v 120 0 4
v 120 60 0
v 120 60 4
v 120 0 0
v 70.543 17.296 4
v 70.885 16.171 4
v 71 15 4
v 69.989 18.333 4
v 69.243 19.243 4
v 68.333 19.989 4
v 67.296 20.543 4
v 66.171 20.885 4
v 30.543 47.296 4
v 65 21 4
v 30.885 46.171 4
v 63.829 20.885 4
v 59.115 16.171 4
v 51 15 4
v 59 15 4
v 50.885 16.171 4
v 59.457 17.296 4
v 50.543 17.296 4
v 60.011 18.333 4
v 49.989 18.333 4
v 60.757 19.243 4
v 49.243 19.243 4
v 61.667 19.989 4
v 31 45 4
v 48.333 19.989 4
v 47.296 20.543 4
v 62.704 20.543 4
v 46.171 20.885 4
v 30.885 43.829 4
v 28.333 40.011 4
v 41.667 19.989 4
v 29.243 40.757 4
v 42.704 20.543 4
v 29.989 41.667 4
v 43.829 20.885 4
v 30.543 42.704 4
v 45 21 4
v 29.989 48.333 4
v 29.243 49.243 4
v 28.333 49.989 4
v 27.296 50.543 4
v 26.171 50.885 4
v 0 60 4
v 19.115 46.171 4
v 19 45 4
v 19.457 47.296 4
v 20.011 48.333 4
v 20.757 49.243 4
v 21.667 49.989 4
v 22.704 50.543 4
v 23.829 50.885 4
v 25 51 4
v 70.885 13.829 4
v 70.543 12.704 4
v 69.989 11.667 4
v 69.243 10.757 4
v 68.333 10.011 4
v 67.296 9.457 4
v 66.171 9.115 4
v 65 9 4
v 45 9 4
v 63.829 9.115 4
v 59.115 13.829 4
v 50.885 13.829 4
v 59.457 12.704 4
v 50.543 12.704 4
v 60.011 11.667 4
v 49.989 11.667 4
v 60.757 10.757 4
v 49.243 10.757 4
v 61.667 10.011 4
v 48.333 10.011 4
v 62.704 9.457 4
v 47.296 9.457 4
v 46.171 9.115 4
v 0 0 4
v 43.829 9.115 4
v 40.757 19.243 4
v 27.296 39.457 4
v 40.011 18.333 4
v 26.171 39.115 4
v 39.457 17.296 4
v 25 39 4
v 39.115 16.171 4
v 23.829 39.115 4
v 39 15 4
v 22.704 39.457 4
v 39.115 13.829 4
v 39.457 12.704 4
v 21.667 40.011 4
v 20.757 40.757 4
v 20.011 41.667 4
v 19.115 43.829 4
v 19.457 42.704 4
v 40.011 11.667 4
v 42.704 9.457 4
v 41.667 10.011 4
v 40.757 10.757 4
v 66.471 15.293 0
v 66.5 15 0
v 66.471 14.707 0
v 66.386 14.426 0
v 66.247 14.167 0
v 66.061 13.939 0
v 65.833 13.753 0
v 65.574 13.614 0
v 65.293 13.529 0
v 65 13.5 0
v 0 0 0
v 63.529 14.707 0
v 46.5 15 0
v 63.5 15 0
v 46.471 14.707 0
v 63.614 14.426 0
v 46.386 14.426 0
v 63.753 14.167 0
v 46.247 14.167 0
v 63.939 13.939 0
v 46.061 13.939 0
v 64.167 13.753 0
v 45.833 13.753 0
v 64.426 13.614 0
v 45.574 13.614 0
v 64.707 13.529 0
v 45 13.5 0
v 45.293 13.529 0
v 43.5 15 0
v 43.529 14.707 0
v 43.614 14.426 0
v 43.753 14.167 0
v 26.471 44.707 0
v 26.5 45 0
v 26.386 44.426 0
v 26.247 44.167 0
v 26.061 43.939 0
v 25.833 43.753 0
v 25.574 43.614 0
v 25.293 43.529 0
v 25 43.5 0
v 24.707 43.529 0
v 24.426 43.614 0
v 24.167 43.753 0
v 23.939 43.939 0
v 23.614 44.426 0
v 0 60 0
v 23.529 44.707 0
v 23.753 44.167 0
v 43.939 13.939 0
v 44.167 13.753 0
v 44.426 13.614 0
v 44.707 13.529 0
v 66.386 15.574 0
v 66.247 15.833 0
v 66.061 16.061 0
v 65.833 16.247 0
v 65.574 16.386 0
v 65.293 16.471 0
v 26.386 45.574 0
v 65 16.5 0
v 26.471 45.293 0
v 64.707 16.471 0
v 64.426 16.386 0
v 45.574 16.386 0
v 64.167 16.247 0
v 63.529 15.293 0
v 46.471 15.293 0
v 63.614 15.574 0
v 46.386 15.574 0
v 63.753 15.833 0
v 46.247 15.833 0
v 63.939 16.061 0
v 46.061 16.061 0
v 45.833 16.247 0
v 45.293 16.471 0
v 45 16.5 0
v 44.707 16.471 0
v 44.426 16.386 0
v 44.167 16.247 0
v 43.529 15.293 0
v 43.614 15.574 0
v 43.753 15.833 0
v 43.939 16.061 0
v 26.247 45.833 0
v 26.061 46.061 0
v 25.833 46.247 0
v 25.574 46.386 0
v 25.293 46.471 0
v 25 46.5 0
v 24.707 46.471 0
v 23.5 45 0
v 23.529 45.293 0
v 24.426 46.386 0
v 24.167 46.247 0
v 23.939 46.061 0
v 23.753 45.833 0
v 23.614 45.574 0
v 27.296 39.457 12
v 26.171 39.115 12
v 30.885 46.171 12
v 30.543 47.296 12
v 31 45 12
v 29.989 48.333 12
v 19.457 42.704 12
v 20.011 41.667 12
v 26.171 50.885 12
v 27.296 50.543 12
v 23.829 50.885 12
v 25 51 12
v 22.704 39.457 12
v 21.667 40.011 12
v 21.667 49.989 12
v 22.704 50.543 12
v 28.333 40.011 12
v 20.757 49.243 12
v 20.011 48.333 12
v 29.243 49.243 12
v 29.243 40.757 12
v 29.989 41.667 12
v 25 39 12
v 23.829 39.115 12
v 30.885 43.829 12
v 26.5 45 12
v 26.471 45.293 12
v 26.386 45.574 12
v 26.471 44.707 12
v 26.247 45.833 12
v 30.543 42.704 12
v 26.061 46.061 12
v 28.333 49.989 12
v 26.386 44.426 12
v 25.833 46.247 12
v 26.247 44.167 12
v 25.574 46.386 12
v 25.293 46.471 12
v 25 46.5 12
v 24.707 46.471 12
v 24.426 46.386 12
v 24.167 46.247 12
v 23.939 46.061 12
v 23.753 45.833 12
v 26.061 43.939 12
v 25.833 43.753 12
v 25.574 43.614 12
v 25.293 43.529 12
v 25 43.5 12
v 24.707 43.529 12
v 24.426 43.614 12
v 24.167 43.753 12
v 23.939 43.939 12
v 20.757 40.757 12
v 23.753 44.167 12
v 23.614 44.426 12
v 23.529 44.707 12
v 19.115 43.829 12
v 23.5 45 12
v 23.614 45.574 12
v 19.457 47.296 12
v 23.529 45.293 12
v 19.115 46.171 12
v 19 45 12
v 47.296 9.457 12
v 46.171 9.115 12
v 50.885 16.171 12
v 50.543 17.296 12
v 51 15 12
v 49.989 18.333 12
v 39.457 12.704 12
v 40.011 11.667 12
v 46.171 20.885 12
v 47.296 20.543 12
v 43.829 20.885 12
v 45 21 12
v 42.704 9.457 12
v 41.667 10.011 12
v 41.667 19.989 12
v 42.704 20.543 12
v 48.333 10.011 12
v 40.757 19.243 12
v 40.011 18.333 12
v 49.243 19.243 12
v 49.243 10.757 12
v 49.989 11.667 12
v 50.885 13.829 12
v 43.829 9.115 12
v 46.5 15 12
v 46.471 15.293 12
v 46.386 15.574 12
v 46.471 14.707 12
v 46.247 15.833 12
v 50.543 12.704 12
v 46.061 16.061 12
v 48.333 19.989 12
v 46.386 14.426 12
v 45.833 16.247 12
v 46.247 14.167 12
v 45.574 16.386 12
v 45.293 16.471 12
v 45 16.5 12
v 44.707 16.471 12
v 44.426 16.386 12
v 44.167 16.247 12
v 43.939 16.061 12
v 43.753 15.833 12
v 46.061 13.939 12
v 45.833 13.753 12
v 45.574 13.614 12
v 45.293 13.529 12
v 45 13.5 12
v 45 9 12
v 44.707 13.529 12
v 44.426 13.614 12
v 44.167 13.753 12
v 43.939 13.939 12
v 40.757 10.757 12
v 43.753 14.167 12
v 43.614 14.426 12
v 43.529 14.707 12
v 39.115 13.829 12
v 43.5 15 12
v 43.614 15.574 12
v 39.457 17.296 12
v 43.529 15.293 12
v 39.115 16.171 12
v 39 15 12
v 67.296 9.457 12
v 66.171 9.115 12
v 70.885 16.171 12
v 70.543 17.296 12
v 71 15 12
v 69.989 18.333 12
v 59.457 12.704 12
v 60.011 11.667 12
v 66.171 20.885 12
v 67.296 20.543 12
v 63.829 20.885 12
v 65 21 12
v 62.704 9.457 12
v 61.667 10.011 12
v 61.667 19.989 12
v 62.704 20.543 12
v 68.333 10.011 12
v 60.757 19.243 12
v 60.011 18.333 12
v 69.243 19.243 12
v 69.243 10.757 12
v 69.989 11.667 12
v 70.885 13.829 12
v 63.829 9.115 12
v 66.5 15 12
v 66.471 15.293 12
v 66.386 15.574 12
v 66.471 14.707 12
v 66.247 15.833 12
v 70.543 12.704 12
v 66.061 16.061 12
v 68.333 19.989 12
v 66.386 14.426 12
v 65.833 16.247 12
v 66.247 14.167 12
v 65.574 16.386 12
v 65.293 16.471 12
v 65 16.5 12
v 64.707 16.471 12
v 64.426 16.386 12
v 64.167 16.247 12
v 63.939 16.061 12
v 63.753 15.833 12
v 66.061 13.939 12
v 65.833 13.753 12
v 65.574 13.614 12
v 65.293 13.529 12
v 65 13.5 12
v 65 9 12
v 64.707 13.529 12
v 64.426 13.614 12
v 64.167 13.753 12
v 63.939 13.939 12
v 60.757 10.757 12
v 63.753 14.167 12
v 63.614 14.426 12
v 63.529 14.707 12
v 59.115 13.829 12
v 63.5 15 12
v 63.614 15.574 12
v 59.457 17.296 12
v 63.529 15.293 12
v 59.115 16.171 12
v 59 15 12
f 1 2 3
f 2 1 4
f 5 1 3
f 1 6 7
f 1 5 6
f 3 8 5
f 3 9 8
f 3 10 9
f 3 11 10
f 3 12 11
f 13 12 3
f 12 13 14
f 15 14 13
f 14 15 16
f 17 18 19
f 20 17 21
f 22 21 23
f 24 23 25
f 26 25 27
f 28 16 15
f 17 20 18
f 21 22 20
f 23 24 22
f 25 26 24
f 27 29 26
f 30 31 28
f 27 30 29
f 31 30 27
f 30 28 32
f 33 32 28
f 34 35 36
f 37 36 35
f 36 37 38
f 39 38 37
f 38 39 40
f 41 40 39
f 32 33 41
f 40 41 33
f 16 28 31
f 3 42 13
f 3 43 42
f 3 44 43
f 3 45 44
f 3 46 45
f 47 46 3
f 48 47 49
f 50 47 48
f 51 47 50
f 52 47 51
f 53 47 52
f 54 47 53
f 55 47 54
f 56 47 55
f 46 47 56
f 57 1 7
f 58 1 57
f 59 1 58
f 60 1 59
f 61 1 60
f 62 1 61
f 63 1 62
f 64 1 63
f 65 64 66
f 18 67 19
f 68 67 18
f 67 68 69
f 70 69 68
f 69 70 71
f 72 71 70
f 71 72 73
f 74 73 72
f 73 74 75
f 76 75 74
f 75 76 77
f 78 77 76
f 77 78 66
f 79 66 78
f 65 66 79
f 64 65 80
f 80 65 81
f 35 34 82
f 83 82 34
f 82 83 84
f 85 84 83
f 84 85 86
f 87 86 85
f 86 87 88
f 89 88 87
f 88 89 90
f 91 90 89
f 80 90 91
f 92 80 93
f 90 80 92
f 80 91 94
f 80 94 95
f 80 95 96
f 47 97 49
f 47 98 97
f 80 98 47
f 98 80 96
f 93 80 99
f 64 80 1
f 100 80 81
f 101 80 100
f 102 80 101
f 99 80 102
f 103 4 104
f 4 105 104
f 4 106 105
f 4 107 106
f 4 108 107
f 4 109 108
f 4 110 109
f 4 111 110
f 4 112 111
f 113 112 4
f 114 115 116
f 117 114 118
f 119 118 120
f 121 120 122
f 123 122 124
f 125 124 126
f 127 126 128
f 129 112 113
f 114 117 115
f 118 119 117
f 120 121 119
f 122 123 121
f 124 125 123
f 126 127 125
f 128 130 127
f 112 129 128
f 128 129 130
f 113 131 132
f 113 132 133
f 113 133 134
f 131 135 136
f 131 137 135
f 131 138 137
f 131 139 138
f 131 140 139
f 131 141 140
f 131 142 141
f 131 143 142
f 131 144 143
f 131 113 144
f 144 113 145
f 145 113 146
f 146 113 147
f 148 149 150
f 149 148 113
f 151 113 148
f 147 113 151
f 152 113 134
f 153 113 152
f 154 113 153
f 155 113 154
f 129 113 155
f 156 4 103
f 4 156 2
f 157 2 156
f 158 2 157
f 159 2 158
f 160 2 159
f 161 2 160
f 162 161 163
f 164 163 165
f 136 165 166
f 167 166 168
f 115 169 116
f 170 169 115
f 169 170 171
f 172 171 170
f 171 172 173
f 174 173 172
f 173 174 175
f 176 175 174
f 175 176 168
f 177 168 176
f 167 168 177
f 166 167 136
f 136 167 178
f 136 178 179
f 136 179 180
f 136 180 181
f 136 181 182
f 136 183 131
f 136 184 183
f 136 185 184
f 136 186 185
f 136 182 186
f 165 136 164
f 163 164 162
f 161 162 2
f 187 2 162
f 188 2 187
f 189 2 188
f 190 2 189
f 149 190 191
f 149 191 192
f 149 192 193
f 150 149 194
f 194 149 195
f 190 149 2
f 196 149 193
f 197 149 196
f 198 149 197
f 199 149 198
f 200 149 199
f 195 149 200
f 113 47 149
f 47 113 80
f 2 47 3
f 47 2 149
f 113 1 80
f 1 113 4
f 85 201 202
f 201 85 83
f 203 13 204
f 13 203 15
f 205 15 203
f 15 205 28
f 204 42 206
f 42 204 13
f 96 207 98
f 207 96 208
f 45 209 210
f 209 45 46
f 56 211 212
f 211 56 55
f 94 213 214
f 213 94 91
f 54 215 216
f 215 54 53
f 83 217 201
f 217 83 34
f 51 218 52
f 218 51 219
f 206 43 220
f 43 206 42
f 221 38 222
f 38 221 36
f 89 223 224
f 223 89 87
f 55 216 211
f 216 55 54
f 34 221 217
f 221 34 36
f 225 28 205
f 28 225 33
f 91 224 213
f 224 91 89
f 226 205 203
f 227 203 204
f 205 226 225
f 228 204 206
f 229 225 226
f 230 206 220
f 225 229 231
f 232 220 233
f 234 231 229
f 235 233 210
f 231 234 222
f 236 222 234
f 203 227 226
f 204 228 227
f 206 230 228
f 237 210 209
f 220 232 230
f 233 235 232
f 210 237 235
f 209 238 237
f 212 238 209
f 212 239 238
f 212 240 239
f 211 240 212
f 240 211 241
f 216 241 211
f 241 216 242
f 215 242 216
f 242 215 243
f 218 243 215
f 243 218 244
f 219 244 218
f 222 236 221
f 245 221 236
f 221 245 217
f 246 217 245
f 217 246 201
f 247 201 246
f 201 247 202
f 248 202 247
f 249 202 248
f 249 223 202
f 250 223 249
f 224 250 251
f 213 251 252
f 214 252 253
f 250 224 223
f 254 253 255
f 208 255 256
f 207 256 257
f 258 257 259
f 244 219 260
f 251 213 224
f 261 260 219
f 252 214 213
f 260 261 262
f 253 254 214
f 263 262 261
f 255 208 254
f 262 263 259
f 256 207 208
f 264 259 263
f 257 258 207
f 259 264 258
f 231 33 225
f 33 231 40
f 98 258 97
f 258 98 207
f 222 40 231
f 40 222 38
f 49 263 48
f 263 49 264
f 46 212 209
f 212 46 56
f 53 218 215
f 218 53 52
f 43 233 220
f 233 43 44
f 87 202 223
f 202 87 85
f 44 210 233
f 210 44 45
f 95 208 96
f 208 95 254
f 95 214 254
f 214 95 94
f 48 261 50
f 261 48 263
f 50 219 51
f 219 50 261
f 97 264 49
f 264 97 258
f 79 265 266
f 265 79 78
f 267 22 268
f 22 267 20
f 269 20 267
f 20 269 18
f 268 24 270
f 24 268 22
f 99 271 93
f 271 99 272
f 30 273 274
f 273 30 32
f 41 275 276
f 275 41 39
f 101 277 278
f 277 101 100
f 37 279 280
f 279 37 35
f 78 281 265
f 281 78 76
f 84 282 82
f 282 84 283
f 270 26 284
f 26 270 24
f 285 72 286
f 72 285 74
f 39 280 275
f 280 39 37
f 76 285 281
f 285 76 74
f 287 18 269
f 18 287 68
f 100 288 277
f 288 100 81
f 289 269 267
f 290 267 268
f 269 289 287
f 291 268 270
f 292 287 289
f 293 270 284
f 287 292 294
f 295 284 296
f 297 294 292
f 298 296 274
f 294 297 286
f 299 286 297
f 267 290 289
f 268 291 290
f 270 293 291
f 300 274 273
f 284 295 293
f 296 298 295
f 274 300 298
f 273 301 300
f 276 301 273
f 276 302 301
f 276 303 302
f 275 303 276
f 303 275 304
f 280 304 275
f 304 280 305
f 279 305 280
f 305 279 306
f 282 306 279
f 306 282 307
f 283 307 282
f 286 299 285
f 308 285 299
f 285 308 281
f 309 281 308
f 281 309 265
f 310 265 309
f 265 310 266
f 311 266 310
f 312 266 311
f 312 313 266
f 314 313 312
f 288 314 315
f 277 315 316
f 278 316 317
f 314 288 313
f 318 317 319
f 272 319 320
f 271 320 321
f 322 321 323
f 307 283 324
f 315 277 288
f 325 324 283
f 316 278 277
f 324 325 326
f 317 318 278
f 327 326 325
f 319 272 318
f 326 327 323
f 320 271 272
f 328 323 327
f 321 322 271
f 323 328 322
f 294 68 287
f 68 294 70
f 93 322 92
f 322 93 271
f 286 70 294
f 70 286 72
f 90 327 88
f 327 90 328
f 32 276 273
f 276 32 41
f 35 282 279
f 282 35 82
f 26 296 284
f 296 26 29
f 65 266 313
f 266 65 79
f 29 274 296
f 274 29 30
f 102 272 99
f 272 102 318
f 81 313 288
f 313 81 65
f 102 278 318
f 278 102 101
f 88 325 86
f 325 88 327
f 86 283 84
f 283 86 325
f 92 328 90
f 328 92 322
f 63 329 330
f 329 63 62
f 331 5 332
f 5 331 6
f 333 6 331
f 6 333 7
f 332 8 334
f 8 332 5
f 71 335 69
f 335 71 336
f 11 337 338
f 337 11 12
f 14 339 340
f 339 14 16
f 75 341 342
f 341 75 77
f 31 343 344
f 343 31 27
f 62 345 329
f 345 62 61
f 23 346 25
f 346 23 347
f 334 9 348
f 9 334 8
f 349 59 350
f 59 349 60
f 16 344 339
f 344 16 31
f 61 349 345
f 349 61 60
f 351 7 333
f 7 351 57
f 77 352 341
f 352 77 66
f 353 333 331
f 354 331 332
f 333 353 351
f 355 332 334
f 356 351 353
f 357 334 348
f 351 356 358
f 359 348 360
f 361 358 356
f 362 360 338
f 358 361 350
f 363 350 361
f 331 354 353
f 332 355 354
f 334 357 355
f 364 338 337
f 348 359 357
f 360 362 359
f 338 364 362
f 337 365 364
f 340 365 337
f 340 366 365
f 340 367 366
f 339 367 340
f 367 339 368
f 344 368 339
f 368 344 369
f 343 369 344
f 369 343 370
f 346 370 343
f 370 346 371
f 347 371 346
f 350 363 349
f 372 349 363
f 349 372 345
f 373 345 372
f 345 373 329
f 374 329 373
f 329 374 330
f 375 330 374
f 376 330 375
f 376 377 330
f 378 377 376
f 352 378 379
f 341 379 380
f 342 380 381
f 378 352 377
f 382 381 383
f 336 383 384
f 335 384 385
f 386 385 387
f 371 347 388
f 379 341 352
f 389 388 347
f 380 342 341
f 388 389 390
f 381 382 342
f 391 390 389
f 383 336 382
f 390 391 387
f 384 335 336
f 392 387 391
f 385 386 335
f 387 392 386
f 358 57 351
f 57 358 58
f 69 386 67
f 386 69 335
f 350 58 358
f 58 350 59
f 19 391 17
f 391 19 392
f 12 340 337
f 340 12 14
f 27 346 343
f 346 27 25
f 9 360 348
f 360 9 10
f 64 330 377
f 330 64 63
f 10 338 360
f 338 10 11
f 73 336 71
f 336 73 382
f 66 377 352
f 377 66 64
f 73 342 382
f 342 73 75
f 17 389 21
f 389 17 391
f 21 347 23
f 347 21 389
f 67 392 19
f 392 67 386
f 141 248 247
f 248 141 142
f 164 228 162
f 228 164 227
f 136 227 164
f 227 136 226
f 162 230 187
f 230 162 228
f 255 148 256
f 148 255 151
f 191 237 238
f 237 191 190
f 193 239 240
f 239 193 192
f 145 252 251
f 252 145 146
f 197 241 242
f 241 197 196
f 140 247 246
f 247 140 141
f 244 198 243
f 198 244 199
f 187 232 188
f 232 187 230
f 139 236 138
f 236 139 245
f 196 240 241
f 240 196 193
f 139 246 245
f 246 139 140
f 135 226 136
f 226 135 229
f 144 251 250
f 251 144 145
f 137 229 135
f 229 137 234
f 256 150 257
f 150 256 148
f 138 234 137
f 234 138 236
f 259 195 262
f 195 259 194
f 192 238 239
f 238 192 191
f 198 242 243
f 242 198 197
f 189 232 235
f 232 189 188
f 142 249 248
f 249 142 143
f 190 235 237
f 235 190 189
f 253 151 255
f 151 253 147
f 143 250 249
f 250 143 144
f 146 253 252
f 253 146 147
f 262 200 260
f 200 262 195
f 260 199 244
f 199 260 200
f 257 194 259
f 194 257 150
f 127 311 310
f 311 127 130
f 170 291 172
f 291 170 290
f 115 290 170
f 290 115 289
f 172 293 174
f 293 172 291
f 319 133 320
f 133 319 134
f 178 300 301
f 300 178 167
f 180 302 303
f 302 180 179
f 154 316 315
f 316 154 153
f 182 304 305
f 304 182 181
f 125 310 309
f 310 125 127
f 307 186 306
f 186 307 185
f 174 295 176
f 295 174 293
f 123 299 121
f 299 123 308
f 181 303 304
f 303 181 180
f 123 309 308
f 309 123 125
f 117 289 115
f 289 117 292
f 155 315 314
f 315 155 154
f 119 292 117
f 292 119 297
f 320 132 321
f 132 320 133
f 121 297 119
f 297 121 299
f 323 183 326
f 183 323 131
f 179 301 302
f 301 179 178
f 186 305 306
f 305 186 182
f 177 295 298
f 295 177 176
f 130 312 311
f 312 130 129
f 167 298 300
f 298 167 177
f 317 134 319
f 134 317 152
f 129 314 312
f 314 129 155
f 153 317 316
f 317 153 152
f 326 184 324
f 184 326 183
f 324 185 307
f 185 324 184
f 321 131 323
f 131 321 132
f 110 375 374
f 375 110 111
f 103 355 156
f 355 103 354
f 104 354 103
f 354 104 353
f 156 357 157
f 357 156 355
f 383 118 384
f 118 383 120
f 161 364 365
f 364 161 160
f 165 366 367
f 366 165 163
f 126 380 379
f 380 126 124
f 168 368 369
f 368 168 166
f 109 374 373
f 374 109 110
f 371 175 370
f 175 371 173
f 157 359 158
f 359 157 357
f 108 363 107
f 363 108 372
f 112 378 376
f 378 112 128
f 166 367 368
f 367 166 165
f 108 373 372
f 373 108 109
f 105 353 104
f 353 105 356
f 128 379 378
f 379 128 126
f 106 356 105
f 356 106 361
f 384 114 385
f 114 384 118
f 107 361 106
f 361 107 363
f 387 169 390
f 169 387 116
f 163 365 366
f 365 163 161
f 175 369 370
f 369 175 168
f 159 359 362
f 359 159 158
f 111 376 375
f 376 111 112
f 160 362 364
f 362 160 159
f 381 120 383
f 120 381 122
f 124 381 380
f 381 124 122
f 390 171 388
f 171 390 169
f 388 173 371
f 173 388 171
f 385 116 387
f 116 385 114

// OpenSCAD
$fn = 32;

// ----------------------------------------------------------------------
// Boss field: plate with bosses at given coordinates
// ----------------------------------------------------------------------

// --- parameters (mm) ---
plate_l = 120;            // plate length, X
plate_w = 60;             // plate width, Y
plate_t = 4;              // plate thickness, Z
boss_d = 12;              // boss diameter
boss_h = 8;               // boss height above the plate
bore_d = 3;               // boss bore

total_h = plate_t + boss_h;  // overall height

difference() {
  union() {
    cube([plate_l, plate_w, plate_t]);
    translate([25, 45, plate_t]) cylinder(h = boss_h, d = boss_d);
    translate([45, 15, plate_t]) cylinder(h = boss_h, d = boss_d);
    translate([65, 15, plate_t]) cylinder(h = boss_h, d = boss_d);
  }
  translate([25, 45, -1]) cylinder(h = total_h + 2, d = bore_d);
  translate([45, 15, -1]) cylinder(h = total_h + 2, d = bore_d);
  translate([65, 15, -1]) cylinder(h = total_h + 2, d = bore_d);
}
